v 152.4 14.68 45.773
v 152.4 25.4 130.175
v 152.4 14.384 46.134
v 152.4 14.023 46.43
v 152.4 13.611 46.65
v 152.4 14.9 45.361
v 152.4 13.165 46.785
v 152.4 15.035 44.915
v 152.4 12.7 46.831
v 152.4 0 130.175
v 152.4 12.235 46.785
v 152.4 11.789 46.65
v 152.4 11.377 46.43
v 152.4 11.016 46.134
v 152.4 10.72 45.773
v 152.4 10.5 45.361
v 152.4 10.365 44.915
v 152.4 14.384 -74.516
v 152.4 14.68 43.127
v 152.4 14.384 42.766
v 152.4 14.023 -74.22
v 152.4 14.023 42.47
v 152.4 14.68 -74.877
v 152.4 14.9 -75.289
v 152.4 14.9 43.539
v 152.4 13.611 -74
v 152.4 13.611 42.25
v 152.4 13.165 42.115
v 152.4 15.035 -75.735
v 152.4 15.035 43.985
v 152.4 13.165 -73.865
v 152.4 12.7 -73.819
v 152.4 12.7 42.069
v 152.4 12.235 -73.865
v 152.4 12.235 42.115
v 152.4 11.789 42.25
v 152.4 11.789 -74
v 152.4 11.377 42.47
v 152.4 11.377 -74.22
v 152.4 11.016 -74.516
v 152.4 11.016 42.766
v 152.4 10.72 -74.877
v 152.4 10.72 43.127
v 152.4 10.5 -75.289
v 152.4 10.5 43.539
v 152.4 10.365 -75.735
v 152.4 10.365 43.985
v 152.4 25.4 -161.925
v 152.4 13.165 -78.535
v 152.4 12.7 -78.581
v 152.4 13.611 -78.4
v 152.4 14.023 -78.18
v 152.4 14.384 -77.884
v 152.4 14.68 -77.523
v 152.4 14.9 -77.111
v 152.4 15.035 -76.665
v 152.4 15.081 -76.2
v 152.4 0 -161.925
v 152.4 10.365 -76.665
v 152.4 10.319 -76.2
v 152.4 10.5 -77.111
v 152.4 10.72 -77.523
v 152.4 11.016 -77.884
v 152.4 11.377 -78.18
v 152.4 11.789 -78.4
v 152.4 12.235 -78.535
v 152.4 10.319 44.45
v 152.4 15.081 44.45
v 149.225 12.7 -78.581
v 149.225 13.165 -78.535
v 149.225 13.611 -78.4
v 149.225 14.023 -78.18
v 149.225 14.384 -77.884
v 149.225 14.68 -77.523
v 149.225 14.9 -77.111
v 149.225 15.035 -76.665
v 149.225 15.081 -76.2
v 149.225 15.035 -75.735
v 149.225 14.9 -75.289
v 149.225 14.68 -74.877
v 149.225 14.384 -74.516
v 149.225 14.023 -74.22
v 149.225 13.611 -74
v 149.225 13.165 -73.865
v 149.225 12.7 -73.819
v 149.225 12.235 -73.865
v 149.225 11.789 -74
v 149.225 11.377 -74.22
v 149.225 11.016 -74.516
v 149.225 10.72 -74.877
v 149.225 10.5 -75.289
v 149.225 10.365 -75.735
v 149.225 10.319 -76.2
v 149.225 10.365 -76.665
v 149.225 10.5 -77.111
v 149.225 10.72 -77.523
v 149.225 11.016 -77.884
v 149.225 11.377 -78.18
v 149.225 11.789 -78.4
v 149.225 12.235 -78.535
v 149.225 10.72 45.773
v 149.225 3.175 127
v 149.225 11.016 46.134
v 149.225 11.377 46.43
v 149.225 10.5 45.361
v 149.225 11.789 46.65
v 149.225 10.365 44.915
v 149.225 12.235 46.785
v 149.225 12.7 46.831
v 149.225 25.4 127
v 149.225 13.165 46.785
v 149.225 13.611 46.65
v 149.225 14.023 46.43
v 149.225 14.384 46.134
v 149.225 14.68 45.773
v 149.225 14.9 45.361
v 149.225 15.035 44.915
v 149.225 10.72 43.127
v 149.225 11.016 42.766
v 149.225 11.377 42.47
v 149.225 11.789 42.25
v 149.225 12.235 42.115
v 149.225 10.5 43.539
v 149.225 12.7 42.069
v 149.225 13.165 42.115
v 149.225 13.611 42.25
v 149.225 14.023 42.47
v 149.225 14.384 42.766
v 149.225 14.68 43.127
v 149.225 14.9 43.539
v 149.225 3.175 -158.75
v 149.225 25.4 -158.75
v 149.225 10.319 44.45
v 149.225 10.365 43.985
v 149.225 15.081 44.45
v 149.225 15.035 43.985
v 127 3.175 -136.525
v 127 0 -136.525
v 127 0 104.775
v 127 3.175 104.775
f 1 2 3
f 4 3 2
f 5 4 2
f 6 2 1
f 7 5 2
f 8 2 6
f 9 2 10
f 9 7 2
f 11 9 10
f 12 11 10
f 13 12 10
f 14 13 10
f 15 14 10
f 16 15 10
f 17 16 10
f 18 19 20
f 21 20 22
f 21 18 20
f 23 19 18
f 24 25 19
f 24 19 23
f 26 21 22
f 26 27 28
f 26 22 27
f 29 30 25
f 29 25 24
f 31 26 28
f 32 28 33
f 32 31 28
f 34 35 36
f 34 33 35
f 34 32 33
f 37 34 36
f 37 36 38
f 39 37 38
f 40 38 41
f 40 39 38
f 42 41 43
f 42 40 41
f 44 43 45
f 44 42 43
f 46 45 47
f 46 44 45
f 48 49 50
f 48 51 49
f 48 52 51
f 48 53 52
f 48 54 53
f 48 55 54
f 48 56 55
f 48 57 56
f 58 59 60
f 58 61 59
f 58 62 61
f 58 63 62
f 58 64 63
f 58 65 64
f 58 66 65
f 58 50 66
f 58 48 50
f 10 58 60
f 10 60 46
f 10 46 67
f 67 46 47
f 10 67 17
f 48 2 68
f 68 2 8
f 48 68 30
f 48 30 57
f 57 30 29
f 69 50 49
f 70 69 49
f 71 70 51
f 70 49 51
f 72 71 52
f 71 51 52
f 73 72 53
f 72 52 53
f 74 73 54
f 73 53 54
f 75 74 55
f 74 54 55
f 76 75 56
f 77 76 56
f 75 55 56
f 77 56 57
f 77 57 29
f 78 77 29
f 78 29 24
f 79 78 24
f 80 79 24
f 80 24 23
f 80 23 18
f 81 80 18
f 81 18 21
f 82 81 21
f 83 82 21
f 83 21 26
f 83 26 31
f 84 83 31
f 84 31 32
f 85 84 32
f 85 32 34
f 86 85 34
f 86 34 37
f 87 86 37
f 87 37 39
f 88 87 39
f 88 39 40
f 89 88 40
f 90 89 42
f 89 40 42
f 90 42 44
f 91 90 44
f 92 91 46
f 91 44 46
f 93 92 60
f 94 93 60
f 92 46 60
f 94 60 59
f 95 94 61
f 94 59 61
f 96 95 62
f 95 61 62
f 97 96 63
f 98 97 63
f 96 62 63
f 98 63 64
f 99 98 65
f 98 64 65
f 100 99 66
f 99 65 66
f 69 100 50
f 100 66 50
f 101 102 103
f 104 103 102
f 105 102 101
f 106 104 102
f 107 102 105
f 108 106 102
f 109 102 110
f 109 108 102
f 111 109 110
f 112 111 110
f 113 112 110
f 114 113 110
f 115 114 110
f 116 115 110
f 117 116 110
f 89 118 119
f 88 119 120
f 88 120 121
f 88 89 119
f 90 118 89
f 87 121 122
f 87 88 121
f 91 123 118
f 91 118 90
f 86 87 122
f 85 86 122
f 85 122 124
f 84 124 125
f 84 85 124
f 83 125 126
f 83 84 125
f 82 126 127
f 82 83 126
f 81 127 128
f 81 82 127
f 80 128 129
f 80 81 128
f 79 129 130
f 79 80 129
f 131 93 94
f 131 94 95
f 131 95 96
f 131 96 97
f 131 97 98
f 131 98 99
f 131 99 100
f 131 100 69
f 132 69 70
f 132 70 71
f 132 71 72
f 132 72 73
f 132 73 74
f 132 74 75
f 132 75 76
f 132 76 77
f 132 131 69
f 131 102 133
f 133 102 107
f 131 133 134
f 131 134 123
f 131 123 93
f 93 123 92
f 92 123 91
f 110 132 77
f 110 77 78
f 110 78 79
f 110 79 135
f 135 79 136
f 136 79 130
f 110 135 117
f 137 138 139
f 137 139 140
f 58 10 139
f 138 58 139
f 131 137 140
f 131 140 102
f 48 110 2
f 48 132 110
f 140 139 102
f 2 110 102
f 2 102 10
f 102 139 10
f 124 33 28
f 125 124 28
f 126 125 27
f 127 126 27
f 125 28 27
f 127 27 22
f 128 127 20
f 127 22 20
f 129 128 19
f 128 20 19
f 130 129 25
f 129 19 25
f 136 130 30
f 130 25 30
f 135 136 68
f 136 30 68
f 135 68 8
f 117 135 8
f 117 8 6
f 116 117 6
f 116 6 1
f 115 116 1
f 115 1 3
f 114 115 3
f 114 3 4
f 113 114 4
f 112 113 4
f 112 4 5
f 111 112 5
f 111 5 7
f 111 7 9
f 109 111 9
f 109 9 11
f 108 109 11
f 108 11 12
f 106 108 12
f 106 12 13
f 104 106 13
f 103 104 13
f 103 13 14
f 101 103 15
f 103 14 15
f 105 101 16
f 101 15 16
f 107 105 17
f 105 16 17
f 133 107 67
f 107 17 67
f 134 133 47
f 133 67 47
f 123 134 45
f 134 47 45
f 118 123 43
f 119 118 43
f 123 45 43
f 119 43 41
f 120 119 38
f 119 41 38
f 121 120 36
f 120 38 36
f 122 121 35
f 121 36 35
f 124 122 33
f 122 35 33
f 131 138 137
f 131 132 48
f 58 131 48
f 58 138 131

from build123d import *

# Parameters (mm, degrees)
PAD6965_DEPTH            = 146.05
POCKET670_DEPTH          = 25.401
SKETCH7925_R             = 2.38125
POCKET674_DEPTH          = 25.401
BODY6271_PLACEMENT_ANGLE = 90


with BuildPart() as part:
    # Sketch7919 → Pad6965 (new body, symmetric)
    with BuildSketch(Plane.YZ):
        Polygon((0, 0), (0, -25.4), (3.175, -25.4), (3.175, -3.175), (25.4, -3.175), (25.4, 0), align=None)
    extrude(amount=PAD6965_DEPTH, both=True)

    # Sketch7920 → Pocket670 (cut, through all)
    with BuildSketch(Plane.XZ):
        Polygon((-107.95, -38.1), (-146.05, 0), (-146.05, -38.1), align=None)
        Polygon((107.95, -38.1), (146.05, 0), (146.05, -38.1), align=None)
    extrude(amount=-POCKET670_DEPTH, mode=Mode.SUBTRACT)

    # Sketch7925 → Pocket674 (cut, through all)
    with BuildSketch(Plane.XY):
        with Locations((-60.325, 12.7)):
            Circle(SKETCH7925_R)
        with Locations((60.325, 12.7)):
            Circle(SKETCH7925_R)
    extrude(amount=-POCKET674_DEPTH, mode=Mode.SUBTRACT)


with BuildPart() as part_1:
    # Body6271 placement: moved
    add(part.part.moved(Location((152.4, 0, -15.875))).rotate(Axis((152.4, 0, -15.875), (0, 1, 0)), BODY6271_PLACEMENT_ANGLE))


solid = part_1.part
